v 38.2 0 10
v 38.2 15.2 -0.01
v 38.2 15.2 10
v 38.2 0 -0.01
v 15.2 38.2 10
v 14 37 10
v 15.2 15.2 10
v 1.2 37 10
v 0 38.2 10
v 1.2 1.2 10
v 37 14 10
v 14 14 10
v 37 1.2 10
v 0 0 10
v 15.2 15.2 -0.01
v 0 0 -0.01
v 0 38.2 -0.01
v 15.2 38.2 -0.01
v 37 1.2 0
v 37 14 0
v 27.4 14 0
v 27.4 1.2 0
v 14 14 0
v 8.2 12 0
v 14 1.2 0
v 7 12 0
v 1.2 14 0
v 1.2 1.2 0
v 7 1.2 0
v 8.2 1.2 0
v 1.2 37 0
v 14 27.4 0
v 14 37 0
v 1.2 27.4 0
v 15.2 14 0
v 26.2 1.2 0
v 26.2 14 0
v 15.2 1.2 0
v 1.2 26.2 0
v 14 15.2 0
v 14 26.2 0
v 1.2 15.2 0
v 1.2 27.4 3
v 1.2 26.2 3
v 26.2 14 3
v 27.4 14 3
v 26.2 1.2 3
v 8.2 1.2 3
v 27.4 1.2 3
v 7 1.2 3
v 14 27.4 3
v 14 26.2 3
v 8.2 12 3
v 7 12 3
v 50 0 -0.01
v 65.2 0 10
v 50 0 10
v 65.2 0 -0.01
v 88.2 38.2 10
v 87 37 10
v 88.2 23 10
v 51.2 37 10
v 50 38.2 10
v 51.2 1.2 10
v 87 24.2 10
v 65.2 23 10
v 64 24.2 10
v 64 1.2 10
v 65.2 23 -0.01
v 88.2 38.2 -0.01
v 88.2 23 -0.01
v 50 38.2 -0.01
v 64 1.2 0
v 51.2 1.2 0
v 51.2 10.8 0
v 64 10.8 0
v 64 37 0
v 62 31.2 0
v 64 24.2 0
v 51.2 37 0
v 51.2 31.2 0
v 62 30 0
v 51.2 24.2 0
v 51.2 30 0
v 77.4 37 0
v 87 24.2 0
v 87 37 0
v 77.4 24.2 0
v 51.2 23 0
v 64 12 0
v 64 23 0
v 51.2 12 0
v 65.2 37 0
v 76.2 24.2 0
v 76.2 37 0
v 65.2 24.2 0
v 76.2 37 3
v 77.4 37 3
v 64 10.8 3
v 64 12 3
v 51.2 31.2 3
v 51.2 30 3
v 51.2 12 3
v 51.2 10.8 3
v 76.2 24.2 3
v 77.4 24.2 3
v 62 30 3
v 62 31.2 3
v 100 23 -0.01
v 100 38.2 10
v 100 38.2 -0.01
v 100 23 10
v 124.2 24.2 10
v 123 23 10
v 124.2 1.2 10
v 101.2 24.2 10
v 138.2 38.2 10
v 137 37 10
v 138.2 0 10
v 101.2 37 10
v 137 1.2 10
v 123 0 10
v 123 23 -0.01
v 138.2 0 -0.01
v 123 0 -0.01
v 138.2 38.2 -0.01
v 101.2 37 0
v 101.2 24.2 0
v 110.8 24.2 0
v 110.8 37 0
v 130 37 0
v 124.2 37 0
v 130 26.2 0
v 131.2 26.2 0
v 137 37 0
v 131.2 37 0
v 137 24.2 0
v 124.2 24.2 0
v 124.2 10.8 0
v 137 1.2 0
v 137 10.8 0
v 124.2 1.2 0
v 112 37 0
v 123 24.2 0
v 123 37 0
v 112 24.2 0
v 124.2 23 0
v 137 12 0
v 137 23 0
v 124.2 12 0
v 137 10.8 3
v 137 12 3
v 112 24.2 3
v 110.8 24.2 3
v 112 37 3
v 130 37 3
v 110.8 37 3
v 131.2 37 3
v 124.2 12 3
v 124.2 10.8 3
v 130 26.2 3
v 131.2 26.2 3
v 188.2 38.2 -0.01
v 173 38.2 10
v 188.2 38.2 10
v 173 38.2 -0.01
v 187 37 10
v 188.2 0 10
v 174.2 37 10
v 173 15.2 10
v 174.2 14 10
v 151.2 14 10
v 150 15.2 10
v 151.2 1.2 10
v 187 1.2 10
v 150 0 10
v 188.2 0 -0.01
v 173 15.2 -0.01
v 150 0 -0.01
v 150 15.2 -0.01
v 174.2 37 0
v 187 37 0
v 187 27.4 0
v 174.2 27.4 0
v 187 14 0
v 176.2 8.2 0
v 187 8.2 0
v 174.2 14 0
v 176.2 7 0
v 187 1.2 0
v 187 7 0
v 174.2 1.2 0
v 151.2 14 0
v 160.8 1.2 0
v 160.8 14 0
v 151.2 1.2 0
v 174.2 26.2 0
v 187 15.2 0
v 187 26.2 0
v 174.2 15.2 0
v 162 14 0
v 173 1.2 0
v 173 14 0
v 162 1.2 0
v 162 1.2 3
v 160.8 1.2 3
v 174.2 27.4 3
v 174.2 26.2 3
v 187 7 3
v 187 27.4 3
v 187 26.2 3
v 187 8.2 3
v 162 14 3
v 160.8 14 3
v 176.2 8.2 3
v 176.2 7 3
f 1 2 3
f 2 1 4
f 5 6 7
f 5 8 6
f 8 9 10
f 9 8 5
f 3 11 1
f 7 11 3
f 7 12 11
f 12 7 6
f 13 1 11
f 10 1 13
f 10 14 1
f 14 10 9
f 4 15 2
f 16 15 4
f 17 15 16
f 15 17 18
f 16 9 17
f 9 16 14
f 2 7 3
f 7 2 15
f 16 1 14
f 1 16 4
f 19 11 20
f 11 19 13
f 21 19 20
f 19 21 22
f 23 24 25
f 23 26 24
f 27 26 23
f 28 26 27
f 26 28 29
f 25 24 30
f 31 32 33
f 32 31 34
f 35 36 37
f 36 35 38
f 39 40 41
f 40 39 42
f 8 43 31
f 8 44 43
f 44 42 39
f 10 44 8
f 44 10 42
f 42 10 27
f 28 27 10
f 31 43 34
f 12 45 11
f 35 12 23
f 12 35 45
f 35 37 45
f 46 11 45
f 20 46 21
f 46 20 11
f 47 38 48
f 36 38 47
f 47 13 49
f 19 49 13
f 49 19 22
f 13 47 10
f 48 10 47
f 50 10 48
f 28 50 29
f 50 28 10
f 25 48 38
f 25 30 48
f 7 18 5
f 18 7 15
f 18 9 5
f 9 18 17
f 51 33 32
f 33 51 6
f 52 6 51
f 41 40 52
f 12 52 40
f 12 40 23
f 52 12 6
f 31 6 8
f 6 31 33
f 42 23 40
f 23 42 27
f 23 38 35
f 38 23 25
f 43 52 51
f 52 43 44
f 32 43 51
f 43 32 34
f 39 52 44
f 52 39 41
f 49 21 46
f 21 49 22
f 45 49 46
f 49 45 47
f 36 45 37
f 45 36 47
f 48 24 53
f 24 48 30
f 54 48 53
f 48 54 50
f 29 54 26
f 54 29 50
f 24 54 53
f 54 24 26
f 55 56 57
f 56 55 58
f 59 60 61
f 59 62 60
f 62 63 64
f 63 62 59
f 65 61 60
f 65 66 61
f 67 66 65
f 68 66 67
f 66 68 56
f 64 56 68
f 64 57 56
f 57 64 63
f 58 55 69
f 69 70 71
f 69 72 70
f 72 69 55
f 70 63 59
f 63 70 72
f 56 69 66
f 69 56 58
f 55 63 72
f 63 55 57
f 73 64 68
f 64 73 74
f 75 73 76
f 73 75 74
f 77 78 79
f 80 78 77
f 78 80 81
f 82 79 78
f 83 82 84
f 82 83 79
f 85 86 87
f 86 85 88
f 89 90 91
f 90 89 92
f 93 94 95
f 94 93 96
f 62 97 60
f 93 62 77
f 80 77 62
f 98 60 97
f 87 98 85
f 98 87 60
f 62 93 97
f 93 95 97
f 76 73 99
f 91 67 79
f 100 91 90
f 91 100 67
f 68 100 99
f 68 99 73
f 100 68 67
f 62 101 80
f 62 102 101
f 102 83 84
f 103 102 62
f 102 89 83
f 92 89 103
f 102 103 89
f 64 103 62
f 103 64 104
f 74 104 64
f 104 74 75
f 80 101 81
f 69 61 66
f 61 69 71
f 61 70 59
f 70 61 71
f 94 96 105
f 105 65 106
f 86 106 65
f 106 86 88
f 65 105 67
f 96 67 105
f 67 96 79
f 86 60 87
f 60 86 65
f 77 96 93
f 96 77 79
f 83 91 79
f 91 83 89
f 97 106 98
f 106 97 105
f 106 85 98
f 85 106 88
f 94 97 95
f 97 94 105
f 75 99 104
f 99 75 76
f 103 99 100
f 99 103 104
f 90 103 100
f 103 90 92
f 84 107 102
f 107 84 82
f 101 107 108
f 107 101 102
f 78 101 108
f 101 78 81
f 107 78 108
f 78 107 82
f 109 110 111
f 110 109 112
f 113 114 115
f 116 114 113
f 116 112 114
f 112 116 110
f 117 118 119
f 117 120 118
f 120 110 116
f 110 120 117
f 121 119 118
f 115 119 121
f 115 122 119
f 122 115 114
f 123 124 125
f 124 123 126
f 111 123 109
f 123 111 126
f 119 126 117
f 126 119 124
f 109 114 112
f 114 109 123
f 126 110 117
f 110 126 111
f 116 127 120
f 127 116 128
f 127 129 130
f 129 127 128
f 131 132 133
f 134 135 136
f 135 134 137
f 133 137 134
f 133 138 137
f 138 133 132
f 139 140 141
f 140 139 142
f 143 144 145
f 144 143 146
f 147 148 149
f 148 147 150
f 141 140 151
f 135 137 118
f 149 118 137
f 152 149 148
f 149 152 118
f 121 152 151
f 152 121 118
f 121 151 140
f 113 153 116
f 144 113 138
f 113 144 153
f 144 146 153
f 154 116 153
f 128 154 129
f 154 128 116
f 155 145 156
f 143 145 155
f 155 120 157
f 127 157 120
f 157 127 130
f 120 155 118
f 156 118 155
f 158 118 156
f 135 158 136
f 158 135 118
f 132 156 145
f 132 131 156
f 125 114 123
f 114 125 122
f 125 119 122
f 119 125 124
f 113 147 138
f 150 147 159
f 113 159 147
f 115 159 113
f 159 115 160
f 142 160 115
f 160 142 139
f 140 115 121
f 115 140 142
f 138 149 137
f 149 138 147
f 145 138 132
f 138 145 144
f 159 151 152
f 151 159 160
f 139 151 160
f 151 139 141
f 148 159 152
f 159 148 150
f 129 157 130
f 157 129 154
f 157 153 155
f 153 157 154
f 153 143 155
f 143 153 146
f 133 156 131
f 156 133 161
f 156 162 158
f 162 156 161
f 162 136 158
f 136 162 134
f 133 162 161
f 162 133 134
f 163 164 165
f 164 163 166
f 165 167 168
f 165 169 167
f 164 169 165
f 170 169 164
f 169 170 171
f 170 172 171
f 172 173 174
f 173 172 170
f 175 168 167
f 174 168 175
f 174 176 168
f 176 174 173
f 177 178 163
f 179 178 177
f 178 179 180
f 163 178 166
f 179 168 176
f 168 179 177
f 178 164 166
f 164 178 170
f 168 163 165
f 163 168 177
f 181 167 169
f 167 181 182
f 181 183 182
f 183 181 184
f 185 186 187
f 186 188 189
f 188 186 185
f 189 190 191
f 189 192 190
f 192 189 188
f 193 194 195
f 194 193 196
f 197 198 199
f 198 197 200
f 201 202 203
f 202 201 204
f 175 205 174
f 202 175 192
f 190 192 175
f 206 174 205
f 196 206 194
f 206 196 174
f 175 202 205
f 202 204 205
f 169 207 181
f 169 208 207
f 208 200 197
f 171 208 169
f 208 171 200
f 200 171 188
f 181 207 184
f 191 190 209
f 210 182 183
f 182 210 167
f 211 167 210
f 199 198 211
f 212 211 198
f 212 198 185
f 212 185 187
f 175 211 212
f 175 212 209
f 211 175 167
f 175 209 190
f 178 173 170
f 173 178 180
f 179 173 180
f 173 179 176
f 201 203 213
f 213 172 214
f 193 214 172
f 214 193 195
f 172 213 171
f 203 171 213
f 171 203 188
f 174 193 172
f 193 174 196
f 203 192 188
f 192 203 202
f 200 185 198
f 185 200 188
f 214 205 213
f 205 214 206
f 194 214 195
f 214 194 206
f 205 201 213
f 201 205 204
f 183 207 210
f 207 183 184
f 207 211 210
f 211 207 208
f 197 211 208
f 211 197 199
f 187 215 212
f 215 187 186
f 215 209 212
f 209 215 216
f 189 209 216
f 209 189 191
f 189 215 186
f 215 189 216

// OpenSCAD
// file: ../../Base/Boxes.scad
// Fischertechnik Box Foundation
// Pre-designed Boxes

use <Constants.scad>

include <PlacementOptions.scad>

box190Width = 190;
box190Depth = 130;
box130Width = 130;
box130Depth = 95;
boxUsageHeight = 33.9;
boxWallThickness = 2.4;
boxBaseThickness = 1.0;
boxWebWidth = 3.0;

// getBoxWallThickness()
// Gets the wall thickness of a Fischertechnik Box

function getBoxWallThickness() = boxWallThickness;

// Gets the usable height of a fischertechnik box
function getBoxUsageHeight() = boxUsageHeight;

// Gets the thickness of the Fischertechnik box base.
function getBoxBaseThickness() = boxBaseThickness;

// Gets the width of a box web
function getBoxWebWidth() = boxWebWidth;

// Gets the usable inner space of a Box 190 as an x/y-list
function getBox190Space() = [
    box190Width - 2*getBoxWallThickness(), 
    box190Depth - 2*getBoxWallThickness() ];

// Imports the Fischertechnik empty box 130x190 mm and places it at position 0,0
// 190x130 are the outer sizes, the inner space is slightly smaller. Use getBox190Space() to get the inner sizes.
// This module needs the STL file "Fischertechnik Box 130x190.stl" in the library path.
// The box is positioned that the usable inner space is at the 0,0,0 position. The

module Box190() {
    translate([-getBoxWallThickness(),-getBoxWallThickness(),-getBoxBaseThickness()])
        import("Fischertechnik Box 130x190.stl", convexity=3);
}

// Gets the usable inner space of a Box 130 as an x/y-list
function getBox130Space() = [
    box130Width - 2*getBoxWallThickness(), 
    box130Depth - 2*getBoxWallThickness() ];

// Imports the Fischertechnik empty box 95x130 mm and places it at position 0,0
// 190x130 are the outer sizes, the inner space is slightly smaller. Use getBox190Space() to get the inner sizes.
// This module needs the STL file "Fischertechnik Box 95x130.stl" in the library path.
// The box is positioned that the usable inner space is at the 0,0,0 position. The

module Box130() {
    translate([-getBoxWallThickness(),-getBoxWallThickness(),-getBoxBaseThickness()])
        import("Fischertechnik Box 95x130.stl", convexity=3);
}

// Creates a web at the specified box walls
// corner 0 = LowerLeft, 1 = UpperLeft, 2 = UpperRight, 3 = LowerRight
// side 0 = LeftOfCorner, 1 = RightOfCorner
// distance = Distance in mm from the corner
// box = inner width and depth of the box (default: Box 190)
// webWidth = length of the web (default is 3 mms)
// webThickness = thickness of the web (default is 1 mm)

module BoxWeb(corner, side, distance, box=getBox190Space(), webWidth=getBoxWebWidth(), webThickness=1.0) {
    sink = getBoxWallThickness()/2;

    width = (corner % 2 == 0) ? 
            (side == LeftOfCorner ? webWidth : webThickness) :
            (side == LeftOfCorner ? webThickness : webWidth);

    depth = (corner % 2 == 0) ? 
            (side == RightOfCorner ? webWidth : webThickness) :
            (side == RightOfCorner ? webThickness : webWidth);
    
    xDiff = corner == LowerLeft ? 
                (side == LeftOfCorner ? -sink : distance) :
            (corner == UpperLeft ?                
                (side == LeftOfCorner ? distance : -sink) :
            (corner == UpperRight ?
                (side == LeftOfCorner ? box.x-webWidth+sink : box.x-distance-webThickness) :
                (side == LeftOfCorner ? box.x-distance-webThickness: box.x-webWidth+sink)));

    yDiff = corner == LowerLeft ? 
                (side == RightOfCorner ? -sink : distance) :
            (corner == UpperLeft ?
                (side == RightOfCorner ? box.y-distance : box.y-webWidth+sink) :
            (corner == UpperRight ?
                (side == RightOfCorner ? box.y-webWidth+sink : box.y-distance) :
                (side == RightOfCorner ? distance : -sink)));
    
    translate([xDiff, yDiff, -getExcess()])
        cube([width, depth, boxUsageHeight + 2*getExcess()]);
}
// file: ../../Base/Rotation.scad
// Fischertechnik Box Foundation
// Geometry Helpers Rotation

include <PlacementOptions.scad>

// getRotatedSpace(space, rotation=NoRotation)
// Rotates the space dependent on the specified rotation

function getRotatedSpace(space, rotation=NoRotation) = [
    (rotation == Rotate90 || rotation == Rotate270) ? space.y : space.x,
    (rotation == Rotate90 || rotation == Rotate270) ? space.x : space.y
];

// Rotates the given space around the fixed left lower corner
// space = the space the children needs as width/depth list [width,depth]
// rotation = 0 Rotate0 degrees, 1 Rotate90 degrees, 2 Rotate180 degrees, 3 Rotate270 degrees (equivalent to -90)

module RotateFix(space, rotation=Rotate0) {
    dy = (rotation == Rotate0 || rotation == Rotate270) ? 0 :
        (rotation == Rotate90) ? space.x :
        space.y;
    dx = (rotation < Rotate180) ? 0 :
        (rotation == Rotate180) ? space.x :
        space.y;
    
    translate([dx, dy, 0])
        rotate([0, 0, rotations[rotation]])
            children();
}
// file: ../../Base/Alignment.scad
// Fischertechnik Box Foundation
// Geometry Helpers Alignment

include <PlacementOptions.scad>

// getAlignedX(elementWidth, spaceWidth, align=AlignRight, offset=0)
// Gets the aligned X offset of an element with the given
// width in the given space.
// elementWidth = The width of the element to positon
// spaceWidth = The space where the element should be aligned
// align = 0 AlignLeft, 1 AlignCenter, 2 AlignRight
// offset = an optional offset from the aligned position. When
// aligned left or centered, then positive values are in X direction.
// When aligned right then positive values are in negative X direction.

function getAlignedX(elementWidth, spaceWidth, align=AlignRight, offset=0) =
    (align == AlignLeft) ?
        offset :
        ((align == AlignCenter) ?
        (spaceWidth - elementWidth)/2 + offset :
        spaceWidth - offset - elementWidth);

// getAlignedY(elementDepth, spaceDepth, align=AlignTop, offset=0)
// Gets the aligned Y offset of an element with the given
// depth in the given space.
// elementDepth = The depth of the element to positon
// spaceDepth = The space where the element should be aligned
// align = 0 AlignBottom, 1 AlignCenter, 2 AlignTop
// offset = an optional offset from the aligned position. When
// aligned bottom or centered, then positive values are in Y direction.
// When aligned top then positive values are in negative Y direction.

function getAlignedY(elementDepth, spaceDepth, align=AlignTop, offset=0) =
    (align == AlignBottom) ?
        offset :
        ((align == AlignCenter) ?
        (spaceDepth - elementDepth)/2 + offset :
        spaceDepth - offset - elementDepth);
// file: ../../Base/Constants.scad
// Fischertechnik Box Foundation
// Constants

// Constant values necessary for multiple elements

// Base constants
dividerThickness = 1.2;
excess = 0.01;
fragments = 90;
tolerance = 0.8;

// Gets the thickness of a divider 
function getDividerThickness() = dividerThickness;

// Gets the excess that is used to merge walls into each other
function getExcess() = excess;

// Gets amount of fragments of a cylinder
function getFragments() = fragments;

// Gets the inner tolerance of a frame to each side
function getTolerance() = tolerance;


// Fischertechnik specific constants
axisDiameter = 4;
axisBottomDiameter = axisDiameter + 1;
standardEdgeDistance = 2.5;
standardWebDistance = 11.5;
standardCornerLength = 15;
tubeWallFactor = 1.6;

// Gets axis diameter
function getAxisDiameter() = axisDiameter;

// Gets axis bottom diameter for thicker part at the bottom
function getAxisBottomDiameter() = axisBottomDiameter;

// gets the standard distance to the wall of the box for dockable frames with webs
function getStandardEdgeDistance() = standardEdgeDistance;

// gets the standard distance of each web to the corner of the dockable frame
function getStandardWebDistance() = standardWebDistance;

// gets the standard length of the corner walls of a dockable frame
function getStandardCornerLength() = standardCornerLength;

// gets the wall thickness of a tube.
function getTubeWallThickness() = tubeWallFactor * getDividerThickness();
// file: ../../Base/PlacementOptions.scad
// Fischertechnik Box Foundation
// Placement Options

// Alignment
NoAlign = 0;
AlignLeft = 1;
AlignBottom = 2;
AlignCenter = 3;
AlignRight = 4;
AlignTop = 5;

// Element rotation degree steps
rotations = [0, -90, -180, -270];

// Rotation
NoRotation = 0;
Rotate0 = 0;
Rotate90 = 1;
Rotate180 = 2;
Rotate270 = 3;

// Docking (seen from above)
NoDock = -1;
DockLeft = 0;
DockTop = 1;
DockRight = 2;
DockCorner = 2;
DockBottom = 3;

// Web corners
LowerLeft = 0;
UpperLeft = 1;
UpperRight = 2;
LowerRight = 3;

// Web position relative to corner
LeftOfCorner = 0;
RightOfCorner = 1;
// file: ../../Elements/FrameUniversalJointCardan.scad
// Fischertechnik Box Library
// Frame for universal joint cardan
// 31044

use <../Base/Constants.scad>
use <../Base/Placement.scad>
use <../ModelBase/Simple.scad>

width = 35;
depth = 12;
height = 10;

// getFrameUniversalJointCardanSpace()
// Gets the complete space of the universal joint cardan frame

function getFrameUniversalJointCardanSpace() = getAngledFrameOuterVolume(width, depth, width, depth, height);

// FrameUniversalJointCardan()
// Frame for a universal joint cardan (as mot1)

module FrameUniversalJointCardan() {
    AngledFrame(width, depth, width, depth, height);
    
    innerVolume = getFrameInnerVolume([width, depth, height]);
    
    webEndDistance = 12;
    webHeight = 3;
    Place(getDividerThickness() - getExcess(), getFrameUniversalJointCardanSpace().y - webEndDistance)
        Wall([innerVolume.y+2*getExcess(), getDividerThickness(), webHeight]);
    Place(getFrameUniversalJointCardanSpace().y - webEndDistance, getDividerThickness() - getExcess())
        Wall([getDividerThickness(), innerVolume.y+2*getExcess(), webHeight]);
    Place((innerVolume.y + getDividerThickness()) / 2, getDividerThickness() - getExcess())
        Wall([getDividerThickness(), innerVolume.y+getExcess() - 2, webHeight]);
}

// Test
color("lightgray")
FrameUniversalJointCardan();
// file: ../../Base/Placement.scad
// Fischertechnik Box Foundation
// Geometry Helpers Placement

use <Constants.scad>
use <Alignment.scad>
use <Rotation.scad>
use <Boxes.scad>

include <PlacementOptions.scad>

// Place(x=0, y=0, elementSpace=[0,0], alignX=AlignLeft, alignY=AlignBottom, rotation=Rotate0, boxSpace=getBox190Space())
// Places the child at the specified position
// y = Y-Position. This is a relative position when an X aligment is specified.
// x = X-Position. This is a relative position when an Y aligment is specified.
// elementSpace = space of the element to be placed [x,y]
// alignX = -1=NoAlign, 0 AlignLeft, 1 AlignCenter, 3 AlignRight (elementSpace and boxSpace required!)
// alignY = -1=NoAlign, 2 AlignBottom, 1 AlignCenter, 4 AlignTop (elementSpace and boxSpace required!)
// rotation = 0 Rotate0 0 degrees, 1 Rotate90 90 degrees, 
// 2 Rotate180 180 degrees, 3 Rotate270 270 degrees (equivalent to -90)
// boxSpace = Inner space of the box where the placement occurs [x,y] - default is Box 190x130 inner space

module Place(x=0, y=0, elementSpace=[0,0], 
  alignX=AlignLeft, alignY=AlignBottom, 
  rotation=NoRotation, boxSpace=getBox190Space()) {

    module Position(x, y, space, rotation=Rotate0) {
        translate([x, y, 0])
            RotateFix(space, rotation)
                children(0);
    }

    space = getRotatedSpace(elementSpace, rotation);
    alignedX = getAlignedX(space.x, boxSpace.x, alignX, x);
    alignedY = getAlignedY(space.y, boxSpace.y, alignY, y);
    Position(alignedX, alignedY, elementSpace, rotation)
        children();
}

// Center(space=getBox130Space(), elementSpace=[0,0])
// space = Space where the children is centered. For cylinder use centered=true and no elementSpace.
// elementSpace = space of the element to be centered [x,y]

module Center(space=getBox190Space(), elementSpace=[0,0]) {
    translate([(space.x - elementSpace.x) / 2, (space.y - elementSpace.y) / 2])
        children(0);
}

// CenterHorizontal(width=0, y=0, offset=0, space=getBox130Space())
// space = Space where the children is centered. For cylinder use centered=true and no elementSpace.
// elementSpace = space of the element to be centered [x,y]

module CenterHorizontal(width=0, y=0, offset=0, space=getBox190Space()) {
    translate([(space.x - width) / 2 + offset, y])
        children(0);
}

// CenterVertical(depth=0, x=0, offset=0, space=getBox130Space())
// space = Space where the children is centered. For cylinder use centered=true and no elementSpace.
// elementSpace = space of the element to be centered [x,y]

module CenterVertical(depth=0, x=0, offset=0, space=getBox190Space()) {
    translate([x, (space.y - depth) / 2 + offset])
        children(0);
}
// main file
// Fischertechnik Box Foundation
// Elements
// Test FrameUniversalJointCardan

use <../../Base/Placement.scad>
use <../../Elements/FrameUniversalJointCardan.scad>

include <../../Base/PlacementOptions.scad>

FrameUniversalJointCardan();

Place(50, 0, getFrameUniversalJointCardanSpace(), rotation=Rotate90)
    FrameUniversalJointCardan();

Place(100, 0, getFrameUniversalJointCardanSpace(), rotation=Rotate180)
    FrameUniversalJointCardan();

Place(150, 0, getFrameUniversalJointCardanSpace(), rotation=Rotate270)
    FrameUniversalJointCardan();
